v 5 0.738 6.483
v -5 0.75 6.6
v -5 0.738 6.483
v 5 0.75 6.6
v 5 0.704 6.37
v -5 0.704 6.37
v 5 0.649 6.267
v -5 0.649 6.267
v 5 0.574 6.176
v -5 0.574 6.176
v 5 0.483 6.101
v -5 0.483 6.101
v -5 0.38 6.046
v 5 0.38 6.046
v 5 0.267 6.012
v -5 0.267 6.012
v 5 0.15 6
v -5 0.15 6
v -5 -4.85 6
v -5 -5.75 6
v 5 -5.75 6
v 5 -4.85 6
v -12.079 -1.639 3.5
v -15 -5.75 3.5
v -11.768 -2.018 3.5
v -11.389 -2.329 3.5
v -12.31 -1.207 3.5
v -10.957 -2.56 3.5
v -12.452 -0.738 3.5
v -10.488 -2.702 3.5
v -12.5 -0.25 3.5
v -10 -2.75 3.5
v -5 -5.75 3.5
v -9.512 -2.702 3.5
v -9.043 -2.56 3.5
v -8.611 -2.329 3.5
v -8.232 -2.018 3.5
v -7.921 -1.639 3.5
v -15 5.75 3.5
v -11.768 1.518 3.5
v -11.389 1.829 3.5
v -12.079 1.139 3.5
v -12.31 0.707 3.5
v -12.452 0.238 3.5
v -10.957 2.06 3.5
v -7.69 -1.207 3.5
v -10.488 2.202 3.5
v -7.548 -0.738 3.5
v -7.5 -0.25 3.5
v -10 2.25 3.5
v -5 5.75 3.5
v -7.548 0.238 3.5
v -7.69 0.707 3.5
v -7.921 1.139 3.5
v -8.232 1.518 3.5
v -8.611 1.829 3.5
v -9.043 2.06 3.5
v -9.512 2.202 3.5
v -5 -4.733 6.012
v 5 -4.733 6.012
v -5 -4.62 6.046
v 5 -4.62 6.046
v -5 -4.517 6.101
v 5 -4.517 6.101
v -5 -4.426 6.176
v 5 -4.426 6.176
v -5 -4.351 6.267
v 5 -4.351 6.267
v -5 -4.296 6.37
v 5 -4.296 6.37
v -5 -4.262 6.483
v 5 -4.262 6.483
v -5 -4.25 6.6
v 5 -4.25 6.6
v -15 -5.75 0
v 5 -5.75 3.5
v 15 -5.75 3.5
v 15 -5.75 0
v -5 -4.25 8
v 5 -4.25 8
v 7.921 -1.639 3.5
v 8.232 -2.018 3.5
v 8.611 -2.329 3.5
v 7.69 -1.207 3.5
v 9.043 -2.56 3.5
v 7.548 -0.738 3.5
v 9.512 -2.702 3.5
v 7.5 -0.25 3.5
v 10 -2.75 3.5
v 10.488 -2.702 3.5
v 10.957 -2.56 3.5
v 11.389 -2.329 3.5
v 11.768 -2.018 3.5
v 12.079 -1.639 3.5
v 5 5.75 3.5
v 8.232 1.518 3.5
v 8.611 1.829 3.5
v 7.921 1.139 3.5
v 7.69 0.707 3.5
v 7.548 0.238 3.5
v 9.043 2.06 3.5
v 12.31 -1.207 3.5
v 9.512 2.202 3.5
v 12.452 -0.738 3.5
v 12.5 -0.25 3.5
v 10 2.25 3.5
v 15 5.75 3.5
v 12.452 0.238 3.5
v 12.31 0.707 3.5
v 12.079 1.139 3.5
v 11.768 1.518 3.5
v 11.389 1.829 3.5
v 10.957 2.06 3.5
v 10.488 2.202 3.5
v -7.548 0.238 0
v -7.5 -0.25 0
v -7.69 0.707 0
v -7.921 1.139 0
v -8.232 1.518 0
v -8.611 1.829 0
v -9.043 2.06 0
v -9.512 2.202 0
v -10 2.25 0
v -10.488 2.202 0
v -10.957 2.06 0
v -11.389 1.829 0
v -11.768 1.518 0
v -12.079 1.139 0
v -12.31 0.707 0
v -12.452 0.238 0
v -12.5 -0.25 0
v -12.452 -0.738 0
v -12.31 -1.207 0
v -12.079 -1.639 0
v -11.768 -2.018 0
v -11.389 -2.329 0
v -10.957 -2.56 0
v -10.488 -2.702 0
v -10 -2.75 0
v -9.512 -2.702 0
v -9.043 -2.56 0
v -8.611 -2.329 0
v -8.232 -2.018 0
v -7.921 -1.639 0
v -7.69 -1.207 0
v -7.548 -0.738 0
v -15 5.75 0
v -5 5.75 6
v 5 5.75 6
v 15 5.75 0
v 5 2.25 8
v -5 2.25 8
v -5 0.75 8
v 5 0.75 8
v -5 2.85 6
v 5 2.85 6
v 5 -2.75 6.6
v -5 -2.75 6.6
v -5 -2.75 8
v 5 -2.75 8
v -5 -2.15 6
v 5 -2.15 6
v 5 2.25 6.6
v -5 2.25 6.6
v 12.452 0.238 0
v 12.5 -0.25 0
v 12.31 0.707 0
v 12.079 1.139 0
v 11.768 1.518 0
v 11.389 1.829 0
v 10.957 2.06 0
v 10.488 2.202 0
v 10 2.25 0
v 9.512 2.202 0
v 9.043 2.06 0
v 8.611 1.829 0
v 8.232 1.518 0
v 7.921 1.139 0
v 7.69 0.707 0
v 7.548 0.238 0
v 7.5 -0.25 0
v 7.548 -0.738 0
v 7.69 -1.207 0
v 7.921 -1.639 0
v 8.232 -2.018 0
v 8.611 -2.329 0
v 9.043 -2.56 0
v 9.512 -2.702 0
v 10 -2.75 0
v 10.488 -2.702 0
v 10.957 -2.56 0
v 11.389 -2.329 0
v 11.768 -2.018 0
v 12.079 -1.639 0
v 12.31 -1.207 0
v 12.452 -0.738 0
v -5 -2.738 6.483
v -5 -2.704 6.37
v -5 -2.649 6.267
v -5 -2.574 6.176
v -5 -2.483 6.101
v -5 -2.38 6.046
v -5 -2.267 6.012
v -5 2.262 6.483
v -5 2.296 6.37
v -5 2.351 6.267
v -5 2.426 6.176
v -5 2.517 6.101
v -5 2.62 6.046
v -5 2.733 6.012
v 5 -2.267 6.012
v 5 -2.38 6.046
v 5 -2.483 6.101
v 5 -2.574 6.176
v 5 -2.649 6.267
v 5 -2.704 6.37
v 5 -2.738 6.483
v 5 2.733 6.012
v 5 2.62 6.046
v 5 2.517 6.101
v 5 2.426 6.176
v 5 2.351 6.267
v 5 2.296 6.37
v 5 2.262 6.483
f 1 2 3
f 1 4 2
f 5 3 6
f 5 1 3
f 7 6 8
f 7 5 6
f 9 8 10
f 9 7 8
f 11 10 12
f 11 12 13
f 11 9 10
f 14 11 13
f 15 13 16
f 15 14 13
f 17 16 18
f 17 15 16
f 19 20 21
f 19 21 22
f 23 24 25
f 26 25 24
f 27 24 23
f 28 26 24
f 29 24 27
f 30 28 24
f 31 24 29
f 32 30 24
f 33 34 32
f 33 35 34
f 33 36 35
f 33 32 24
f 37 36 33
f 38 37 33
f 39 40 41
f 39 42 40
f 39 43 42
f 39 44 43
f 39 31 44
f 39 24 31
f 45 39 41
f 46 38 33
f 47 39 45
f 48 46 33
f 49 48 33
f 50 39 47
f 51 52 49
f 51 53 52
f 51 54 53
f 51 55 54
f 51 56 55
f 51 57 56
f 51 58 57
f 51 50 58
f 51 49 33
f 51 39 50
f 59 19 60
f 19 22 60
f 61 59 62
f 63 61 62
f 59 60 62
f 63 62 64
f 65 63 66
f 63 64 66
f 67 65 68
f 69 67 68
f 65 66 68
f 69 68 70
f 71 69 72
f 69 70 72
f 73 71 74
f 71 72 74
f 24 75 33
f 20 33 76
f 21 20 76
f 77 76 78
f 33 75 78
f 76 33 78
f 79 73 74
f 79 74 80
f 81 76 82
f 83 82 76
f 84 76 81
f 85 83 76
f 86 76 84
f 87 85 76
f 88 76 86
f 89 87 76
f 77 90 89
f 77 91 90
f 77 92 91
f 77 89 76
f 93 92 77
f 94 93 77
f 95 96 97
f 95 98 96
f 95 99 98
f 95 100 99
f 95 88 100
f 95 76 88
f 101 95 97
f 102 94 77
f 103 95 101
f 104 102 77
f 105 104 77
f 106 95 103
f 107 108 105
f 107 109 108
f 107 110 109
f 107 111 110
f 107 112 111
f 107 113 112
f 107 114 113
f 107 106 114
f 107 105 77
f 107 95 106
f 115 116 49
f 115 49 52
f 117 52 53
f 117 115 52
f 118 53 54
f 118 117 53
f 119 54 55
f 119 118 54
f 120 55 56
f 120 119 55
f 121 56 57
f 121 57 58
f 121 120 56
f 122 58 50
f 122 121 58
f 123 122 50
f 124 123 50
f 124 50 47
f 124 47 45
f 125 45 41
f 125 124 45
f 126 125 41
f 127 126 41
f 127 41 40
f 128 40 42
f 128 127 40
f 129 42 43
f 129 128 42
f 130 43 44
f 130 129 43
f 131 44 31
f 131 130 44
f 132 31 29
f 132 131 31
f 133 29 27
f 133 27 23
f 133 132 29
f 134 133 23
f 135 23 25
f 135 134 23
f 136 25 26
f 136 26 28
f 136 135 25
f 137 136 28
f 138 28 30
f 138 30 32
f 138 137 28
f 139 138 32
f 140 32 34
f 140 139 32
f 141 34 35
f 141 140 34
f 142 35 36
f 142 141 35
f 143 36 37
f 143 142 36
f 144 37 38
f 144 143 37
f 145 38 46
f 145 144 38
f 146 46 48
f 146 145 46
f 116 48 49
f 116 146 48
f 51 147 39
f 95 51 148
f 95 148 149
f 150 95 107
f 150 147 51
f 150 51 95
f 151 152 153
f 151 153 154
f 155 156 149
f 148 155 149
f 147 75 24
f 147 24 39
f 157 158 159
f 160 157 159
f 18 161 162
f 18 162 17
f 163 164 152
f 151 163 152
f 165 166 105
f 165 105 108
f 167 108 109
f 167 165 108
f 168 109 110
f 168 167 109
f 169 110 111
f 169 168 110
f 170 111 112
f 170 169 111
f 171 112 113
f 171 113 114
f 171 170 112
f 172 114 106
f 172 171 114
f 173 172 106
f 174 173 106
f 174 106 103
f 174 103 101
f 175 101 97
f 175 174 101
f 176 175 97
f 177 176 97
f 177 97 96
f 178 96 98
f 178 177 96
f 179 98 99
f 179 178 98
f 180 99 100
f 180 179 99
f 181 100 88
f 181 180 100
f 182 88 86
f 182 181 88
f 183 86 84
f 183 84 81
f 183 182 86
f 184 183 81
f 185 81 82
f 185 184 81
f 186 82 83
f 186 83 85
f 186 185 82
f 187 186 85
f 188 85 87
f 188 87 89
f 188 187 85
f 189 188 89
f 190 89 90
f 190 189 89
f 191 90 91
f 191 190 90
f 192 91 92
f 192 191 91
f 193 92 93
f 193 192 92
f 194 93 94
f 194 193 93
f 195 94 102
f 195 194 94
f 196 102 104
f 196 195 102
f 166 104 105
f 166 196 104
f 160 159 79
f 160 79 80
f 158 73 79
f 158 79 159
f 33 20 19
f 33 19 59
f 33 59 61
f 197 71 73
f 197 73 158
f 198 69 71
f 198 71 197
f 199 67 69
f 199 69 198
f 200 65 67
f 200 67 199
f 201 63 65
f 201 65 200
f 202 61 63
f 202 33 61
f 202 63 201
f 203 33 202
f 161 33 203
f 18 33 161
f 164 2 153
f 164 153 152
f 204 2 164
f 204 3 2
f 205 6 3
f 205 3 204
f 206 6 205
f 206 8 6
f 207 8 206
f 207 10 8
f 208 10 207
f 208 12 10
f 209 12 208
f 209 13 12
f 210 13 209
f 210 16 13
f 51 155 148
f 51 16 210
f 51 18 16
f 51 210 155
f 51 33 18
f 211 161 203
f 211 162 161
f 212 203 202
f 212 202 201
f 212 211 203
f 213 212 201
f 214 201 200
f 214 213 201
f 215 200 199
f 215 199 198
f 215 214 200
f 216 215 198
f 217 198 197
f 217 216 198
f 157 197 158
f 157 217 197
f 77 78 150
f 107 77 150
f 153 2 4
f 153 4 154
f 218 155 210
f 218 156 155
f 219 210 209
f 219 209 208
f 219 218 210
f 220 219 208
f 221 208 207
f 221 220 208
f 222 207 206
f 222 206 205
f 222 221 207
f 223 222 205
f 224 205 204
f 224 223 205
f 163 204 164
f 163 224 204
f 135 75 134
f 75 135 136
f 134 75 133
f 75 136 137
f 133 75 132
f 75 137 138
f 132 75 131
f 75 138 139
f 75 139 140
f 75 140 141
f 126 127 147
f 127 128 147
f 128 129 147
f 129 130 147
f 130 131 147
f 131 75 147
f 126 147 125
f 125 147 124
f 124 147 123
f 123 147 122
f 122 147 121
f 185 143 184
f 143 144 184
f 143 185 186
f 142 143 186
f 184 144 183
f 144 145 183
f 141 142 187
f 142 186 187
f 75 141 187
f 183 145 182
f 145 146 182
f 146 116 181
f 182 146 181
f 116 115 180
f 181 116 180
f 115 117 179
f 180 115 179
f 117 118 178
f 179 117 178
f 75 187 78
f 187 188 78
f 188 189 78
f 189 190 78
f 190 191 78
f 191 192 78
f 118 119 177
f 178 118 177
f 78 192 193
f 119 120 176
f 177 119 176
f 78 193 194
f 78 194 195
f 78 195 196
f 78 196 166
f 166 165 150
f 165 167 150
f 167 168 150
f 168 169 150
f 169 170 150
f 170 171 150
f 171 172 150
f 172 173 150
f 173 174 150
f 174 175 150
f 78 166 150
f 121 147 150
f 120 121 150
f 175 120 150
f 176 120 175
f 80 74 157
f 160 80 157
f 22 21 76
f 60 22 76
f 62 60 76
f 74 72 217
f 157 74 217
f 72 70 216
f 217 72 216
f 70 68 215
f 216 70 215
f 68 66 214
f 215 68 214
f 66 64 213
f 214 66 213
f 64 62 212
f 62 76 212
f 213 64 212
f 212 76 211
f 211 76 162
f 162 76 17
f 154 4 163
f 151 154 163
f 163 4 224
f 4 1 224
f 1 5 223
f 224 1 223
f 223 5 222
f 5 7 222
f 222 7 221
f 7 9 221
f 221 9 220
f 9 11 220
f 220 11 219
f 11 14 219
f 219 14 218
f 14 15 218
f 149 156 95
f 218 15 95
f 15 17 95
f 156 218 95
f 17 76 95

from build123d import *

# Parameters (mm, degrees)
SKETCH1_W           = 30
SKETCH1_H           = 11.5
SKETCH1_R           = 2.5
BOSS_EXTRUDE1_DEPTH = 3.5
SKETCH2_W           = 10
SKETCH2_H           = 11.5
BOSS_EXTRUDE2_DEPTH = 4.5
SKETCH3_W           = 2
SKETCH3_H           = 3.5
CUT_EXTRUDE1_DEPTH  = 23.29489852
SKETCH4_W           = 2
SKETCH4_H           = 3.5
CUT_EXTRUDE2_DEPTH  = 10
FILLET2_R           = 0.6


with BuildPart() as part:
    # Sketch1 → Boss-Extrude1 (new body)
    with BuildSketch(Plane.XY):
        Rectangle(SKETCH1_W, SKETCH1_H)
        with Locations((-10, -0.25)):
            Circle(SKETCH1_R, mode=Mode.SUBTRACT)
        with Locations((10, -0.25)):
            Circle(SKETCH1_R, mode=Mode.SUBTRACT)
    extrude(amount=BOSS_EXTRUDE1_DEPTH)

    # Sketch2 → Boss-Extrude2 (add)
    with BuildSketch(Plane.XY.offset(3.5)):
        Rectangle(SKETCH2_W, SKETCH2_H)
    extrude(amount=BOSS_EXTRUDE2_DEPTH)

    # Sketch3 → Cut-Extrude1 (cut, through all)
    with BuildSketch(Plane.ZY.offset(5)):
        with Locations((7, 4)):
            Rectangle(SKETCH3_W, SKETCH3_H)
    extrude(amount=-CUT_EXTRUDE1_DEPTH, mode=Mode.SUBTRACT)

    # Sketch4 → Cut-Extrude2 (cut)
    with BuildSketch(Plane.ZY.offset(5)):
        with Locations((7, -1)):
            Rectangle(SKETCH4_W, SKETCH4_H)
        with Locations((7, -6)):
            Rectangle(SKETCH4_W, SKETCH4_H)
    extrude(amount=-CUT_EXTRUDE2_DEPTH, mode=Mode.SUBTRACT)

    # Fillet2
    fillet2_edges = [part.edges().sort_by_distance(p)[0] for p in [
        (0, 2.25, 6),
        (0, -2.75, 6),
        (0, 0.75, 6),
        (0, -4.25, 6),
    ]]
    fillet(fillet2_edges, radius=FILLET2_R)


solid = part.part
